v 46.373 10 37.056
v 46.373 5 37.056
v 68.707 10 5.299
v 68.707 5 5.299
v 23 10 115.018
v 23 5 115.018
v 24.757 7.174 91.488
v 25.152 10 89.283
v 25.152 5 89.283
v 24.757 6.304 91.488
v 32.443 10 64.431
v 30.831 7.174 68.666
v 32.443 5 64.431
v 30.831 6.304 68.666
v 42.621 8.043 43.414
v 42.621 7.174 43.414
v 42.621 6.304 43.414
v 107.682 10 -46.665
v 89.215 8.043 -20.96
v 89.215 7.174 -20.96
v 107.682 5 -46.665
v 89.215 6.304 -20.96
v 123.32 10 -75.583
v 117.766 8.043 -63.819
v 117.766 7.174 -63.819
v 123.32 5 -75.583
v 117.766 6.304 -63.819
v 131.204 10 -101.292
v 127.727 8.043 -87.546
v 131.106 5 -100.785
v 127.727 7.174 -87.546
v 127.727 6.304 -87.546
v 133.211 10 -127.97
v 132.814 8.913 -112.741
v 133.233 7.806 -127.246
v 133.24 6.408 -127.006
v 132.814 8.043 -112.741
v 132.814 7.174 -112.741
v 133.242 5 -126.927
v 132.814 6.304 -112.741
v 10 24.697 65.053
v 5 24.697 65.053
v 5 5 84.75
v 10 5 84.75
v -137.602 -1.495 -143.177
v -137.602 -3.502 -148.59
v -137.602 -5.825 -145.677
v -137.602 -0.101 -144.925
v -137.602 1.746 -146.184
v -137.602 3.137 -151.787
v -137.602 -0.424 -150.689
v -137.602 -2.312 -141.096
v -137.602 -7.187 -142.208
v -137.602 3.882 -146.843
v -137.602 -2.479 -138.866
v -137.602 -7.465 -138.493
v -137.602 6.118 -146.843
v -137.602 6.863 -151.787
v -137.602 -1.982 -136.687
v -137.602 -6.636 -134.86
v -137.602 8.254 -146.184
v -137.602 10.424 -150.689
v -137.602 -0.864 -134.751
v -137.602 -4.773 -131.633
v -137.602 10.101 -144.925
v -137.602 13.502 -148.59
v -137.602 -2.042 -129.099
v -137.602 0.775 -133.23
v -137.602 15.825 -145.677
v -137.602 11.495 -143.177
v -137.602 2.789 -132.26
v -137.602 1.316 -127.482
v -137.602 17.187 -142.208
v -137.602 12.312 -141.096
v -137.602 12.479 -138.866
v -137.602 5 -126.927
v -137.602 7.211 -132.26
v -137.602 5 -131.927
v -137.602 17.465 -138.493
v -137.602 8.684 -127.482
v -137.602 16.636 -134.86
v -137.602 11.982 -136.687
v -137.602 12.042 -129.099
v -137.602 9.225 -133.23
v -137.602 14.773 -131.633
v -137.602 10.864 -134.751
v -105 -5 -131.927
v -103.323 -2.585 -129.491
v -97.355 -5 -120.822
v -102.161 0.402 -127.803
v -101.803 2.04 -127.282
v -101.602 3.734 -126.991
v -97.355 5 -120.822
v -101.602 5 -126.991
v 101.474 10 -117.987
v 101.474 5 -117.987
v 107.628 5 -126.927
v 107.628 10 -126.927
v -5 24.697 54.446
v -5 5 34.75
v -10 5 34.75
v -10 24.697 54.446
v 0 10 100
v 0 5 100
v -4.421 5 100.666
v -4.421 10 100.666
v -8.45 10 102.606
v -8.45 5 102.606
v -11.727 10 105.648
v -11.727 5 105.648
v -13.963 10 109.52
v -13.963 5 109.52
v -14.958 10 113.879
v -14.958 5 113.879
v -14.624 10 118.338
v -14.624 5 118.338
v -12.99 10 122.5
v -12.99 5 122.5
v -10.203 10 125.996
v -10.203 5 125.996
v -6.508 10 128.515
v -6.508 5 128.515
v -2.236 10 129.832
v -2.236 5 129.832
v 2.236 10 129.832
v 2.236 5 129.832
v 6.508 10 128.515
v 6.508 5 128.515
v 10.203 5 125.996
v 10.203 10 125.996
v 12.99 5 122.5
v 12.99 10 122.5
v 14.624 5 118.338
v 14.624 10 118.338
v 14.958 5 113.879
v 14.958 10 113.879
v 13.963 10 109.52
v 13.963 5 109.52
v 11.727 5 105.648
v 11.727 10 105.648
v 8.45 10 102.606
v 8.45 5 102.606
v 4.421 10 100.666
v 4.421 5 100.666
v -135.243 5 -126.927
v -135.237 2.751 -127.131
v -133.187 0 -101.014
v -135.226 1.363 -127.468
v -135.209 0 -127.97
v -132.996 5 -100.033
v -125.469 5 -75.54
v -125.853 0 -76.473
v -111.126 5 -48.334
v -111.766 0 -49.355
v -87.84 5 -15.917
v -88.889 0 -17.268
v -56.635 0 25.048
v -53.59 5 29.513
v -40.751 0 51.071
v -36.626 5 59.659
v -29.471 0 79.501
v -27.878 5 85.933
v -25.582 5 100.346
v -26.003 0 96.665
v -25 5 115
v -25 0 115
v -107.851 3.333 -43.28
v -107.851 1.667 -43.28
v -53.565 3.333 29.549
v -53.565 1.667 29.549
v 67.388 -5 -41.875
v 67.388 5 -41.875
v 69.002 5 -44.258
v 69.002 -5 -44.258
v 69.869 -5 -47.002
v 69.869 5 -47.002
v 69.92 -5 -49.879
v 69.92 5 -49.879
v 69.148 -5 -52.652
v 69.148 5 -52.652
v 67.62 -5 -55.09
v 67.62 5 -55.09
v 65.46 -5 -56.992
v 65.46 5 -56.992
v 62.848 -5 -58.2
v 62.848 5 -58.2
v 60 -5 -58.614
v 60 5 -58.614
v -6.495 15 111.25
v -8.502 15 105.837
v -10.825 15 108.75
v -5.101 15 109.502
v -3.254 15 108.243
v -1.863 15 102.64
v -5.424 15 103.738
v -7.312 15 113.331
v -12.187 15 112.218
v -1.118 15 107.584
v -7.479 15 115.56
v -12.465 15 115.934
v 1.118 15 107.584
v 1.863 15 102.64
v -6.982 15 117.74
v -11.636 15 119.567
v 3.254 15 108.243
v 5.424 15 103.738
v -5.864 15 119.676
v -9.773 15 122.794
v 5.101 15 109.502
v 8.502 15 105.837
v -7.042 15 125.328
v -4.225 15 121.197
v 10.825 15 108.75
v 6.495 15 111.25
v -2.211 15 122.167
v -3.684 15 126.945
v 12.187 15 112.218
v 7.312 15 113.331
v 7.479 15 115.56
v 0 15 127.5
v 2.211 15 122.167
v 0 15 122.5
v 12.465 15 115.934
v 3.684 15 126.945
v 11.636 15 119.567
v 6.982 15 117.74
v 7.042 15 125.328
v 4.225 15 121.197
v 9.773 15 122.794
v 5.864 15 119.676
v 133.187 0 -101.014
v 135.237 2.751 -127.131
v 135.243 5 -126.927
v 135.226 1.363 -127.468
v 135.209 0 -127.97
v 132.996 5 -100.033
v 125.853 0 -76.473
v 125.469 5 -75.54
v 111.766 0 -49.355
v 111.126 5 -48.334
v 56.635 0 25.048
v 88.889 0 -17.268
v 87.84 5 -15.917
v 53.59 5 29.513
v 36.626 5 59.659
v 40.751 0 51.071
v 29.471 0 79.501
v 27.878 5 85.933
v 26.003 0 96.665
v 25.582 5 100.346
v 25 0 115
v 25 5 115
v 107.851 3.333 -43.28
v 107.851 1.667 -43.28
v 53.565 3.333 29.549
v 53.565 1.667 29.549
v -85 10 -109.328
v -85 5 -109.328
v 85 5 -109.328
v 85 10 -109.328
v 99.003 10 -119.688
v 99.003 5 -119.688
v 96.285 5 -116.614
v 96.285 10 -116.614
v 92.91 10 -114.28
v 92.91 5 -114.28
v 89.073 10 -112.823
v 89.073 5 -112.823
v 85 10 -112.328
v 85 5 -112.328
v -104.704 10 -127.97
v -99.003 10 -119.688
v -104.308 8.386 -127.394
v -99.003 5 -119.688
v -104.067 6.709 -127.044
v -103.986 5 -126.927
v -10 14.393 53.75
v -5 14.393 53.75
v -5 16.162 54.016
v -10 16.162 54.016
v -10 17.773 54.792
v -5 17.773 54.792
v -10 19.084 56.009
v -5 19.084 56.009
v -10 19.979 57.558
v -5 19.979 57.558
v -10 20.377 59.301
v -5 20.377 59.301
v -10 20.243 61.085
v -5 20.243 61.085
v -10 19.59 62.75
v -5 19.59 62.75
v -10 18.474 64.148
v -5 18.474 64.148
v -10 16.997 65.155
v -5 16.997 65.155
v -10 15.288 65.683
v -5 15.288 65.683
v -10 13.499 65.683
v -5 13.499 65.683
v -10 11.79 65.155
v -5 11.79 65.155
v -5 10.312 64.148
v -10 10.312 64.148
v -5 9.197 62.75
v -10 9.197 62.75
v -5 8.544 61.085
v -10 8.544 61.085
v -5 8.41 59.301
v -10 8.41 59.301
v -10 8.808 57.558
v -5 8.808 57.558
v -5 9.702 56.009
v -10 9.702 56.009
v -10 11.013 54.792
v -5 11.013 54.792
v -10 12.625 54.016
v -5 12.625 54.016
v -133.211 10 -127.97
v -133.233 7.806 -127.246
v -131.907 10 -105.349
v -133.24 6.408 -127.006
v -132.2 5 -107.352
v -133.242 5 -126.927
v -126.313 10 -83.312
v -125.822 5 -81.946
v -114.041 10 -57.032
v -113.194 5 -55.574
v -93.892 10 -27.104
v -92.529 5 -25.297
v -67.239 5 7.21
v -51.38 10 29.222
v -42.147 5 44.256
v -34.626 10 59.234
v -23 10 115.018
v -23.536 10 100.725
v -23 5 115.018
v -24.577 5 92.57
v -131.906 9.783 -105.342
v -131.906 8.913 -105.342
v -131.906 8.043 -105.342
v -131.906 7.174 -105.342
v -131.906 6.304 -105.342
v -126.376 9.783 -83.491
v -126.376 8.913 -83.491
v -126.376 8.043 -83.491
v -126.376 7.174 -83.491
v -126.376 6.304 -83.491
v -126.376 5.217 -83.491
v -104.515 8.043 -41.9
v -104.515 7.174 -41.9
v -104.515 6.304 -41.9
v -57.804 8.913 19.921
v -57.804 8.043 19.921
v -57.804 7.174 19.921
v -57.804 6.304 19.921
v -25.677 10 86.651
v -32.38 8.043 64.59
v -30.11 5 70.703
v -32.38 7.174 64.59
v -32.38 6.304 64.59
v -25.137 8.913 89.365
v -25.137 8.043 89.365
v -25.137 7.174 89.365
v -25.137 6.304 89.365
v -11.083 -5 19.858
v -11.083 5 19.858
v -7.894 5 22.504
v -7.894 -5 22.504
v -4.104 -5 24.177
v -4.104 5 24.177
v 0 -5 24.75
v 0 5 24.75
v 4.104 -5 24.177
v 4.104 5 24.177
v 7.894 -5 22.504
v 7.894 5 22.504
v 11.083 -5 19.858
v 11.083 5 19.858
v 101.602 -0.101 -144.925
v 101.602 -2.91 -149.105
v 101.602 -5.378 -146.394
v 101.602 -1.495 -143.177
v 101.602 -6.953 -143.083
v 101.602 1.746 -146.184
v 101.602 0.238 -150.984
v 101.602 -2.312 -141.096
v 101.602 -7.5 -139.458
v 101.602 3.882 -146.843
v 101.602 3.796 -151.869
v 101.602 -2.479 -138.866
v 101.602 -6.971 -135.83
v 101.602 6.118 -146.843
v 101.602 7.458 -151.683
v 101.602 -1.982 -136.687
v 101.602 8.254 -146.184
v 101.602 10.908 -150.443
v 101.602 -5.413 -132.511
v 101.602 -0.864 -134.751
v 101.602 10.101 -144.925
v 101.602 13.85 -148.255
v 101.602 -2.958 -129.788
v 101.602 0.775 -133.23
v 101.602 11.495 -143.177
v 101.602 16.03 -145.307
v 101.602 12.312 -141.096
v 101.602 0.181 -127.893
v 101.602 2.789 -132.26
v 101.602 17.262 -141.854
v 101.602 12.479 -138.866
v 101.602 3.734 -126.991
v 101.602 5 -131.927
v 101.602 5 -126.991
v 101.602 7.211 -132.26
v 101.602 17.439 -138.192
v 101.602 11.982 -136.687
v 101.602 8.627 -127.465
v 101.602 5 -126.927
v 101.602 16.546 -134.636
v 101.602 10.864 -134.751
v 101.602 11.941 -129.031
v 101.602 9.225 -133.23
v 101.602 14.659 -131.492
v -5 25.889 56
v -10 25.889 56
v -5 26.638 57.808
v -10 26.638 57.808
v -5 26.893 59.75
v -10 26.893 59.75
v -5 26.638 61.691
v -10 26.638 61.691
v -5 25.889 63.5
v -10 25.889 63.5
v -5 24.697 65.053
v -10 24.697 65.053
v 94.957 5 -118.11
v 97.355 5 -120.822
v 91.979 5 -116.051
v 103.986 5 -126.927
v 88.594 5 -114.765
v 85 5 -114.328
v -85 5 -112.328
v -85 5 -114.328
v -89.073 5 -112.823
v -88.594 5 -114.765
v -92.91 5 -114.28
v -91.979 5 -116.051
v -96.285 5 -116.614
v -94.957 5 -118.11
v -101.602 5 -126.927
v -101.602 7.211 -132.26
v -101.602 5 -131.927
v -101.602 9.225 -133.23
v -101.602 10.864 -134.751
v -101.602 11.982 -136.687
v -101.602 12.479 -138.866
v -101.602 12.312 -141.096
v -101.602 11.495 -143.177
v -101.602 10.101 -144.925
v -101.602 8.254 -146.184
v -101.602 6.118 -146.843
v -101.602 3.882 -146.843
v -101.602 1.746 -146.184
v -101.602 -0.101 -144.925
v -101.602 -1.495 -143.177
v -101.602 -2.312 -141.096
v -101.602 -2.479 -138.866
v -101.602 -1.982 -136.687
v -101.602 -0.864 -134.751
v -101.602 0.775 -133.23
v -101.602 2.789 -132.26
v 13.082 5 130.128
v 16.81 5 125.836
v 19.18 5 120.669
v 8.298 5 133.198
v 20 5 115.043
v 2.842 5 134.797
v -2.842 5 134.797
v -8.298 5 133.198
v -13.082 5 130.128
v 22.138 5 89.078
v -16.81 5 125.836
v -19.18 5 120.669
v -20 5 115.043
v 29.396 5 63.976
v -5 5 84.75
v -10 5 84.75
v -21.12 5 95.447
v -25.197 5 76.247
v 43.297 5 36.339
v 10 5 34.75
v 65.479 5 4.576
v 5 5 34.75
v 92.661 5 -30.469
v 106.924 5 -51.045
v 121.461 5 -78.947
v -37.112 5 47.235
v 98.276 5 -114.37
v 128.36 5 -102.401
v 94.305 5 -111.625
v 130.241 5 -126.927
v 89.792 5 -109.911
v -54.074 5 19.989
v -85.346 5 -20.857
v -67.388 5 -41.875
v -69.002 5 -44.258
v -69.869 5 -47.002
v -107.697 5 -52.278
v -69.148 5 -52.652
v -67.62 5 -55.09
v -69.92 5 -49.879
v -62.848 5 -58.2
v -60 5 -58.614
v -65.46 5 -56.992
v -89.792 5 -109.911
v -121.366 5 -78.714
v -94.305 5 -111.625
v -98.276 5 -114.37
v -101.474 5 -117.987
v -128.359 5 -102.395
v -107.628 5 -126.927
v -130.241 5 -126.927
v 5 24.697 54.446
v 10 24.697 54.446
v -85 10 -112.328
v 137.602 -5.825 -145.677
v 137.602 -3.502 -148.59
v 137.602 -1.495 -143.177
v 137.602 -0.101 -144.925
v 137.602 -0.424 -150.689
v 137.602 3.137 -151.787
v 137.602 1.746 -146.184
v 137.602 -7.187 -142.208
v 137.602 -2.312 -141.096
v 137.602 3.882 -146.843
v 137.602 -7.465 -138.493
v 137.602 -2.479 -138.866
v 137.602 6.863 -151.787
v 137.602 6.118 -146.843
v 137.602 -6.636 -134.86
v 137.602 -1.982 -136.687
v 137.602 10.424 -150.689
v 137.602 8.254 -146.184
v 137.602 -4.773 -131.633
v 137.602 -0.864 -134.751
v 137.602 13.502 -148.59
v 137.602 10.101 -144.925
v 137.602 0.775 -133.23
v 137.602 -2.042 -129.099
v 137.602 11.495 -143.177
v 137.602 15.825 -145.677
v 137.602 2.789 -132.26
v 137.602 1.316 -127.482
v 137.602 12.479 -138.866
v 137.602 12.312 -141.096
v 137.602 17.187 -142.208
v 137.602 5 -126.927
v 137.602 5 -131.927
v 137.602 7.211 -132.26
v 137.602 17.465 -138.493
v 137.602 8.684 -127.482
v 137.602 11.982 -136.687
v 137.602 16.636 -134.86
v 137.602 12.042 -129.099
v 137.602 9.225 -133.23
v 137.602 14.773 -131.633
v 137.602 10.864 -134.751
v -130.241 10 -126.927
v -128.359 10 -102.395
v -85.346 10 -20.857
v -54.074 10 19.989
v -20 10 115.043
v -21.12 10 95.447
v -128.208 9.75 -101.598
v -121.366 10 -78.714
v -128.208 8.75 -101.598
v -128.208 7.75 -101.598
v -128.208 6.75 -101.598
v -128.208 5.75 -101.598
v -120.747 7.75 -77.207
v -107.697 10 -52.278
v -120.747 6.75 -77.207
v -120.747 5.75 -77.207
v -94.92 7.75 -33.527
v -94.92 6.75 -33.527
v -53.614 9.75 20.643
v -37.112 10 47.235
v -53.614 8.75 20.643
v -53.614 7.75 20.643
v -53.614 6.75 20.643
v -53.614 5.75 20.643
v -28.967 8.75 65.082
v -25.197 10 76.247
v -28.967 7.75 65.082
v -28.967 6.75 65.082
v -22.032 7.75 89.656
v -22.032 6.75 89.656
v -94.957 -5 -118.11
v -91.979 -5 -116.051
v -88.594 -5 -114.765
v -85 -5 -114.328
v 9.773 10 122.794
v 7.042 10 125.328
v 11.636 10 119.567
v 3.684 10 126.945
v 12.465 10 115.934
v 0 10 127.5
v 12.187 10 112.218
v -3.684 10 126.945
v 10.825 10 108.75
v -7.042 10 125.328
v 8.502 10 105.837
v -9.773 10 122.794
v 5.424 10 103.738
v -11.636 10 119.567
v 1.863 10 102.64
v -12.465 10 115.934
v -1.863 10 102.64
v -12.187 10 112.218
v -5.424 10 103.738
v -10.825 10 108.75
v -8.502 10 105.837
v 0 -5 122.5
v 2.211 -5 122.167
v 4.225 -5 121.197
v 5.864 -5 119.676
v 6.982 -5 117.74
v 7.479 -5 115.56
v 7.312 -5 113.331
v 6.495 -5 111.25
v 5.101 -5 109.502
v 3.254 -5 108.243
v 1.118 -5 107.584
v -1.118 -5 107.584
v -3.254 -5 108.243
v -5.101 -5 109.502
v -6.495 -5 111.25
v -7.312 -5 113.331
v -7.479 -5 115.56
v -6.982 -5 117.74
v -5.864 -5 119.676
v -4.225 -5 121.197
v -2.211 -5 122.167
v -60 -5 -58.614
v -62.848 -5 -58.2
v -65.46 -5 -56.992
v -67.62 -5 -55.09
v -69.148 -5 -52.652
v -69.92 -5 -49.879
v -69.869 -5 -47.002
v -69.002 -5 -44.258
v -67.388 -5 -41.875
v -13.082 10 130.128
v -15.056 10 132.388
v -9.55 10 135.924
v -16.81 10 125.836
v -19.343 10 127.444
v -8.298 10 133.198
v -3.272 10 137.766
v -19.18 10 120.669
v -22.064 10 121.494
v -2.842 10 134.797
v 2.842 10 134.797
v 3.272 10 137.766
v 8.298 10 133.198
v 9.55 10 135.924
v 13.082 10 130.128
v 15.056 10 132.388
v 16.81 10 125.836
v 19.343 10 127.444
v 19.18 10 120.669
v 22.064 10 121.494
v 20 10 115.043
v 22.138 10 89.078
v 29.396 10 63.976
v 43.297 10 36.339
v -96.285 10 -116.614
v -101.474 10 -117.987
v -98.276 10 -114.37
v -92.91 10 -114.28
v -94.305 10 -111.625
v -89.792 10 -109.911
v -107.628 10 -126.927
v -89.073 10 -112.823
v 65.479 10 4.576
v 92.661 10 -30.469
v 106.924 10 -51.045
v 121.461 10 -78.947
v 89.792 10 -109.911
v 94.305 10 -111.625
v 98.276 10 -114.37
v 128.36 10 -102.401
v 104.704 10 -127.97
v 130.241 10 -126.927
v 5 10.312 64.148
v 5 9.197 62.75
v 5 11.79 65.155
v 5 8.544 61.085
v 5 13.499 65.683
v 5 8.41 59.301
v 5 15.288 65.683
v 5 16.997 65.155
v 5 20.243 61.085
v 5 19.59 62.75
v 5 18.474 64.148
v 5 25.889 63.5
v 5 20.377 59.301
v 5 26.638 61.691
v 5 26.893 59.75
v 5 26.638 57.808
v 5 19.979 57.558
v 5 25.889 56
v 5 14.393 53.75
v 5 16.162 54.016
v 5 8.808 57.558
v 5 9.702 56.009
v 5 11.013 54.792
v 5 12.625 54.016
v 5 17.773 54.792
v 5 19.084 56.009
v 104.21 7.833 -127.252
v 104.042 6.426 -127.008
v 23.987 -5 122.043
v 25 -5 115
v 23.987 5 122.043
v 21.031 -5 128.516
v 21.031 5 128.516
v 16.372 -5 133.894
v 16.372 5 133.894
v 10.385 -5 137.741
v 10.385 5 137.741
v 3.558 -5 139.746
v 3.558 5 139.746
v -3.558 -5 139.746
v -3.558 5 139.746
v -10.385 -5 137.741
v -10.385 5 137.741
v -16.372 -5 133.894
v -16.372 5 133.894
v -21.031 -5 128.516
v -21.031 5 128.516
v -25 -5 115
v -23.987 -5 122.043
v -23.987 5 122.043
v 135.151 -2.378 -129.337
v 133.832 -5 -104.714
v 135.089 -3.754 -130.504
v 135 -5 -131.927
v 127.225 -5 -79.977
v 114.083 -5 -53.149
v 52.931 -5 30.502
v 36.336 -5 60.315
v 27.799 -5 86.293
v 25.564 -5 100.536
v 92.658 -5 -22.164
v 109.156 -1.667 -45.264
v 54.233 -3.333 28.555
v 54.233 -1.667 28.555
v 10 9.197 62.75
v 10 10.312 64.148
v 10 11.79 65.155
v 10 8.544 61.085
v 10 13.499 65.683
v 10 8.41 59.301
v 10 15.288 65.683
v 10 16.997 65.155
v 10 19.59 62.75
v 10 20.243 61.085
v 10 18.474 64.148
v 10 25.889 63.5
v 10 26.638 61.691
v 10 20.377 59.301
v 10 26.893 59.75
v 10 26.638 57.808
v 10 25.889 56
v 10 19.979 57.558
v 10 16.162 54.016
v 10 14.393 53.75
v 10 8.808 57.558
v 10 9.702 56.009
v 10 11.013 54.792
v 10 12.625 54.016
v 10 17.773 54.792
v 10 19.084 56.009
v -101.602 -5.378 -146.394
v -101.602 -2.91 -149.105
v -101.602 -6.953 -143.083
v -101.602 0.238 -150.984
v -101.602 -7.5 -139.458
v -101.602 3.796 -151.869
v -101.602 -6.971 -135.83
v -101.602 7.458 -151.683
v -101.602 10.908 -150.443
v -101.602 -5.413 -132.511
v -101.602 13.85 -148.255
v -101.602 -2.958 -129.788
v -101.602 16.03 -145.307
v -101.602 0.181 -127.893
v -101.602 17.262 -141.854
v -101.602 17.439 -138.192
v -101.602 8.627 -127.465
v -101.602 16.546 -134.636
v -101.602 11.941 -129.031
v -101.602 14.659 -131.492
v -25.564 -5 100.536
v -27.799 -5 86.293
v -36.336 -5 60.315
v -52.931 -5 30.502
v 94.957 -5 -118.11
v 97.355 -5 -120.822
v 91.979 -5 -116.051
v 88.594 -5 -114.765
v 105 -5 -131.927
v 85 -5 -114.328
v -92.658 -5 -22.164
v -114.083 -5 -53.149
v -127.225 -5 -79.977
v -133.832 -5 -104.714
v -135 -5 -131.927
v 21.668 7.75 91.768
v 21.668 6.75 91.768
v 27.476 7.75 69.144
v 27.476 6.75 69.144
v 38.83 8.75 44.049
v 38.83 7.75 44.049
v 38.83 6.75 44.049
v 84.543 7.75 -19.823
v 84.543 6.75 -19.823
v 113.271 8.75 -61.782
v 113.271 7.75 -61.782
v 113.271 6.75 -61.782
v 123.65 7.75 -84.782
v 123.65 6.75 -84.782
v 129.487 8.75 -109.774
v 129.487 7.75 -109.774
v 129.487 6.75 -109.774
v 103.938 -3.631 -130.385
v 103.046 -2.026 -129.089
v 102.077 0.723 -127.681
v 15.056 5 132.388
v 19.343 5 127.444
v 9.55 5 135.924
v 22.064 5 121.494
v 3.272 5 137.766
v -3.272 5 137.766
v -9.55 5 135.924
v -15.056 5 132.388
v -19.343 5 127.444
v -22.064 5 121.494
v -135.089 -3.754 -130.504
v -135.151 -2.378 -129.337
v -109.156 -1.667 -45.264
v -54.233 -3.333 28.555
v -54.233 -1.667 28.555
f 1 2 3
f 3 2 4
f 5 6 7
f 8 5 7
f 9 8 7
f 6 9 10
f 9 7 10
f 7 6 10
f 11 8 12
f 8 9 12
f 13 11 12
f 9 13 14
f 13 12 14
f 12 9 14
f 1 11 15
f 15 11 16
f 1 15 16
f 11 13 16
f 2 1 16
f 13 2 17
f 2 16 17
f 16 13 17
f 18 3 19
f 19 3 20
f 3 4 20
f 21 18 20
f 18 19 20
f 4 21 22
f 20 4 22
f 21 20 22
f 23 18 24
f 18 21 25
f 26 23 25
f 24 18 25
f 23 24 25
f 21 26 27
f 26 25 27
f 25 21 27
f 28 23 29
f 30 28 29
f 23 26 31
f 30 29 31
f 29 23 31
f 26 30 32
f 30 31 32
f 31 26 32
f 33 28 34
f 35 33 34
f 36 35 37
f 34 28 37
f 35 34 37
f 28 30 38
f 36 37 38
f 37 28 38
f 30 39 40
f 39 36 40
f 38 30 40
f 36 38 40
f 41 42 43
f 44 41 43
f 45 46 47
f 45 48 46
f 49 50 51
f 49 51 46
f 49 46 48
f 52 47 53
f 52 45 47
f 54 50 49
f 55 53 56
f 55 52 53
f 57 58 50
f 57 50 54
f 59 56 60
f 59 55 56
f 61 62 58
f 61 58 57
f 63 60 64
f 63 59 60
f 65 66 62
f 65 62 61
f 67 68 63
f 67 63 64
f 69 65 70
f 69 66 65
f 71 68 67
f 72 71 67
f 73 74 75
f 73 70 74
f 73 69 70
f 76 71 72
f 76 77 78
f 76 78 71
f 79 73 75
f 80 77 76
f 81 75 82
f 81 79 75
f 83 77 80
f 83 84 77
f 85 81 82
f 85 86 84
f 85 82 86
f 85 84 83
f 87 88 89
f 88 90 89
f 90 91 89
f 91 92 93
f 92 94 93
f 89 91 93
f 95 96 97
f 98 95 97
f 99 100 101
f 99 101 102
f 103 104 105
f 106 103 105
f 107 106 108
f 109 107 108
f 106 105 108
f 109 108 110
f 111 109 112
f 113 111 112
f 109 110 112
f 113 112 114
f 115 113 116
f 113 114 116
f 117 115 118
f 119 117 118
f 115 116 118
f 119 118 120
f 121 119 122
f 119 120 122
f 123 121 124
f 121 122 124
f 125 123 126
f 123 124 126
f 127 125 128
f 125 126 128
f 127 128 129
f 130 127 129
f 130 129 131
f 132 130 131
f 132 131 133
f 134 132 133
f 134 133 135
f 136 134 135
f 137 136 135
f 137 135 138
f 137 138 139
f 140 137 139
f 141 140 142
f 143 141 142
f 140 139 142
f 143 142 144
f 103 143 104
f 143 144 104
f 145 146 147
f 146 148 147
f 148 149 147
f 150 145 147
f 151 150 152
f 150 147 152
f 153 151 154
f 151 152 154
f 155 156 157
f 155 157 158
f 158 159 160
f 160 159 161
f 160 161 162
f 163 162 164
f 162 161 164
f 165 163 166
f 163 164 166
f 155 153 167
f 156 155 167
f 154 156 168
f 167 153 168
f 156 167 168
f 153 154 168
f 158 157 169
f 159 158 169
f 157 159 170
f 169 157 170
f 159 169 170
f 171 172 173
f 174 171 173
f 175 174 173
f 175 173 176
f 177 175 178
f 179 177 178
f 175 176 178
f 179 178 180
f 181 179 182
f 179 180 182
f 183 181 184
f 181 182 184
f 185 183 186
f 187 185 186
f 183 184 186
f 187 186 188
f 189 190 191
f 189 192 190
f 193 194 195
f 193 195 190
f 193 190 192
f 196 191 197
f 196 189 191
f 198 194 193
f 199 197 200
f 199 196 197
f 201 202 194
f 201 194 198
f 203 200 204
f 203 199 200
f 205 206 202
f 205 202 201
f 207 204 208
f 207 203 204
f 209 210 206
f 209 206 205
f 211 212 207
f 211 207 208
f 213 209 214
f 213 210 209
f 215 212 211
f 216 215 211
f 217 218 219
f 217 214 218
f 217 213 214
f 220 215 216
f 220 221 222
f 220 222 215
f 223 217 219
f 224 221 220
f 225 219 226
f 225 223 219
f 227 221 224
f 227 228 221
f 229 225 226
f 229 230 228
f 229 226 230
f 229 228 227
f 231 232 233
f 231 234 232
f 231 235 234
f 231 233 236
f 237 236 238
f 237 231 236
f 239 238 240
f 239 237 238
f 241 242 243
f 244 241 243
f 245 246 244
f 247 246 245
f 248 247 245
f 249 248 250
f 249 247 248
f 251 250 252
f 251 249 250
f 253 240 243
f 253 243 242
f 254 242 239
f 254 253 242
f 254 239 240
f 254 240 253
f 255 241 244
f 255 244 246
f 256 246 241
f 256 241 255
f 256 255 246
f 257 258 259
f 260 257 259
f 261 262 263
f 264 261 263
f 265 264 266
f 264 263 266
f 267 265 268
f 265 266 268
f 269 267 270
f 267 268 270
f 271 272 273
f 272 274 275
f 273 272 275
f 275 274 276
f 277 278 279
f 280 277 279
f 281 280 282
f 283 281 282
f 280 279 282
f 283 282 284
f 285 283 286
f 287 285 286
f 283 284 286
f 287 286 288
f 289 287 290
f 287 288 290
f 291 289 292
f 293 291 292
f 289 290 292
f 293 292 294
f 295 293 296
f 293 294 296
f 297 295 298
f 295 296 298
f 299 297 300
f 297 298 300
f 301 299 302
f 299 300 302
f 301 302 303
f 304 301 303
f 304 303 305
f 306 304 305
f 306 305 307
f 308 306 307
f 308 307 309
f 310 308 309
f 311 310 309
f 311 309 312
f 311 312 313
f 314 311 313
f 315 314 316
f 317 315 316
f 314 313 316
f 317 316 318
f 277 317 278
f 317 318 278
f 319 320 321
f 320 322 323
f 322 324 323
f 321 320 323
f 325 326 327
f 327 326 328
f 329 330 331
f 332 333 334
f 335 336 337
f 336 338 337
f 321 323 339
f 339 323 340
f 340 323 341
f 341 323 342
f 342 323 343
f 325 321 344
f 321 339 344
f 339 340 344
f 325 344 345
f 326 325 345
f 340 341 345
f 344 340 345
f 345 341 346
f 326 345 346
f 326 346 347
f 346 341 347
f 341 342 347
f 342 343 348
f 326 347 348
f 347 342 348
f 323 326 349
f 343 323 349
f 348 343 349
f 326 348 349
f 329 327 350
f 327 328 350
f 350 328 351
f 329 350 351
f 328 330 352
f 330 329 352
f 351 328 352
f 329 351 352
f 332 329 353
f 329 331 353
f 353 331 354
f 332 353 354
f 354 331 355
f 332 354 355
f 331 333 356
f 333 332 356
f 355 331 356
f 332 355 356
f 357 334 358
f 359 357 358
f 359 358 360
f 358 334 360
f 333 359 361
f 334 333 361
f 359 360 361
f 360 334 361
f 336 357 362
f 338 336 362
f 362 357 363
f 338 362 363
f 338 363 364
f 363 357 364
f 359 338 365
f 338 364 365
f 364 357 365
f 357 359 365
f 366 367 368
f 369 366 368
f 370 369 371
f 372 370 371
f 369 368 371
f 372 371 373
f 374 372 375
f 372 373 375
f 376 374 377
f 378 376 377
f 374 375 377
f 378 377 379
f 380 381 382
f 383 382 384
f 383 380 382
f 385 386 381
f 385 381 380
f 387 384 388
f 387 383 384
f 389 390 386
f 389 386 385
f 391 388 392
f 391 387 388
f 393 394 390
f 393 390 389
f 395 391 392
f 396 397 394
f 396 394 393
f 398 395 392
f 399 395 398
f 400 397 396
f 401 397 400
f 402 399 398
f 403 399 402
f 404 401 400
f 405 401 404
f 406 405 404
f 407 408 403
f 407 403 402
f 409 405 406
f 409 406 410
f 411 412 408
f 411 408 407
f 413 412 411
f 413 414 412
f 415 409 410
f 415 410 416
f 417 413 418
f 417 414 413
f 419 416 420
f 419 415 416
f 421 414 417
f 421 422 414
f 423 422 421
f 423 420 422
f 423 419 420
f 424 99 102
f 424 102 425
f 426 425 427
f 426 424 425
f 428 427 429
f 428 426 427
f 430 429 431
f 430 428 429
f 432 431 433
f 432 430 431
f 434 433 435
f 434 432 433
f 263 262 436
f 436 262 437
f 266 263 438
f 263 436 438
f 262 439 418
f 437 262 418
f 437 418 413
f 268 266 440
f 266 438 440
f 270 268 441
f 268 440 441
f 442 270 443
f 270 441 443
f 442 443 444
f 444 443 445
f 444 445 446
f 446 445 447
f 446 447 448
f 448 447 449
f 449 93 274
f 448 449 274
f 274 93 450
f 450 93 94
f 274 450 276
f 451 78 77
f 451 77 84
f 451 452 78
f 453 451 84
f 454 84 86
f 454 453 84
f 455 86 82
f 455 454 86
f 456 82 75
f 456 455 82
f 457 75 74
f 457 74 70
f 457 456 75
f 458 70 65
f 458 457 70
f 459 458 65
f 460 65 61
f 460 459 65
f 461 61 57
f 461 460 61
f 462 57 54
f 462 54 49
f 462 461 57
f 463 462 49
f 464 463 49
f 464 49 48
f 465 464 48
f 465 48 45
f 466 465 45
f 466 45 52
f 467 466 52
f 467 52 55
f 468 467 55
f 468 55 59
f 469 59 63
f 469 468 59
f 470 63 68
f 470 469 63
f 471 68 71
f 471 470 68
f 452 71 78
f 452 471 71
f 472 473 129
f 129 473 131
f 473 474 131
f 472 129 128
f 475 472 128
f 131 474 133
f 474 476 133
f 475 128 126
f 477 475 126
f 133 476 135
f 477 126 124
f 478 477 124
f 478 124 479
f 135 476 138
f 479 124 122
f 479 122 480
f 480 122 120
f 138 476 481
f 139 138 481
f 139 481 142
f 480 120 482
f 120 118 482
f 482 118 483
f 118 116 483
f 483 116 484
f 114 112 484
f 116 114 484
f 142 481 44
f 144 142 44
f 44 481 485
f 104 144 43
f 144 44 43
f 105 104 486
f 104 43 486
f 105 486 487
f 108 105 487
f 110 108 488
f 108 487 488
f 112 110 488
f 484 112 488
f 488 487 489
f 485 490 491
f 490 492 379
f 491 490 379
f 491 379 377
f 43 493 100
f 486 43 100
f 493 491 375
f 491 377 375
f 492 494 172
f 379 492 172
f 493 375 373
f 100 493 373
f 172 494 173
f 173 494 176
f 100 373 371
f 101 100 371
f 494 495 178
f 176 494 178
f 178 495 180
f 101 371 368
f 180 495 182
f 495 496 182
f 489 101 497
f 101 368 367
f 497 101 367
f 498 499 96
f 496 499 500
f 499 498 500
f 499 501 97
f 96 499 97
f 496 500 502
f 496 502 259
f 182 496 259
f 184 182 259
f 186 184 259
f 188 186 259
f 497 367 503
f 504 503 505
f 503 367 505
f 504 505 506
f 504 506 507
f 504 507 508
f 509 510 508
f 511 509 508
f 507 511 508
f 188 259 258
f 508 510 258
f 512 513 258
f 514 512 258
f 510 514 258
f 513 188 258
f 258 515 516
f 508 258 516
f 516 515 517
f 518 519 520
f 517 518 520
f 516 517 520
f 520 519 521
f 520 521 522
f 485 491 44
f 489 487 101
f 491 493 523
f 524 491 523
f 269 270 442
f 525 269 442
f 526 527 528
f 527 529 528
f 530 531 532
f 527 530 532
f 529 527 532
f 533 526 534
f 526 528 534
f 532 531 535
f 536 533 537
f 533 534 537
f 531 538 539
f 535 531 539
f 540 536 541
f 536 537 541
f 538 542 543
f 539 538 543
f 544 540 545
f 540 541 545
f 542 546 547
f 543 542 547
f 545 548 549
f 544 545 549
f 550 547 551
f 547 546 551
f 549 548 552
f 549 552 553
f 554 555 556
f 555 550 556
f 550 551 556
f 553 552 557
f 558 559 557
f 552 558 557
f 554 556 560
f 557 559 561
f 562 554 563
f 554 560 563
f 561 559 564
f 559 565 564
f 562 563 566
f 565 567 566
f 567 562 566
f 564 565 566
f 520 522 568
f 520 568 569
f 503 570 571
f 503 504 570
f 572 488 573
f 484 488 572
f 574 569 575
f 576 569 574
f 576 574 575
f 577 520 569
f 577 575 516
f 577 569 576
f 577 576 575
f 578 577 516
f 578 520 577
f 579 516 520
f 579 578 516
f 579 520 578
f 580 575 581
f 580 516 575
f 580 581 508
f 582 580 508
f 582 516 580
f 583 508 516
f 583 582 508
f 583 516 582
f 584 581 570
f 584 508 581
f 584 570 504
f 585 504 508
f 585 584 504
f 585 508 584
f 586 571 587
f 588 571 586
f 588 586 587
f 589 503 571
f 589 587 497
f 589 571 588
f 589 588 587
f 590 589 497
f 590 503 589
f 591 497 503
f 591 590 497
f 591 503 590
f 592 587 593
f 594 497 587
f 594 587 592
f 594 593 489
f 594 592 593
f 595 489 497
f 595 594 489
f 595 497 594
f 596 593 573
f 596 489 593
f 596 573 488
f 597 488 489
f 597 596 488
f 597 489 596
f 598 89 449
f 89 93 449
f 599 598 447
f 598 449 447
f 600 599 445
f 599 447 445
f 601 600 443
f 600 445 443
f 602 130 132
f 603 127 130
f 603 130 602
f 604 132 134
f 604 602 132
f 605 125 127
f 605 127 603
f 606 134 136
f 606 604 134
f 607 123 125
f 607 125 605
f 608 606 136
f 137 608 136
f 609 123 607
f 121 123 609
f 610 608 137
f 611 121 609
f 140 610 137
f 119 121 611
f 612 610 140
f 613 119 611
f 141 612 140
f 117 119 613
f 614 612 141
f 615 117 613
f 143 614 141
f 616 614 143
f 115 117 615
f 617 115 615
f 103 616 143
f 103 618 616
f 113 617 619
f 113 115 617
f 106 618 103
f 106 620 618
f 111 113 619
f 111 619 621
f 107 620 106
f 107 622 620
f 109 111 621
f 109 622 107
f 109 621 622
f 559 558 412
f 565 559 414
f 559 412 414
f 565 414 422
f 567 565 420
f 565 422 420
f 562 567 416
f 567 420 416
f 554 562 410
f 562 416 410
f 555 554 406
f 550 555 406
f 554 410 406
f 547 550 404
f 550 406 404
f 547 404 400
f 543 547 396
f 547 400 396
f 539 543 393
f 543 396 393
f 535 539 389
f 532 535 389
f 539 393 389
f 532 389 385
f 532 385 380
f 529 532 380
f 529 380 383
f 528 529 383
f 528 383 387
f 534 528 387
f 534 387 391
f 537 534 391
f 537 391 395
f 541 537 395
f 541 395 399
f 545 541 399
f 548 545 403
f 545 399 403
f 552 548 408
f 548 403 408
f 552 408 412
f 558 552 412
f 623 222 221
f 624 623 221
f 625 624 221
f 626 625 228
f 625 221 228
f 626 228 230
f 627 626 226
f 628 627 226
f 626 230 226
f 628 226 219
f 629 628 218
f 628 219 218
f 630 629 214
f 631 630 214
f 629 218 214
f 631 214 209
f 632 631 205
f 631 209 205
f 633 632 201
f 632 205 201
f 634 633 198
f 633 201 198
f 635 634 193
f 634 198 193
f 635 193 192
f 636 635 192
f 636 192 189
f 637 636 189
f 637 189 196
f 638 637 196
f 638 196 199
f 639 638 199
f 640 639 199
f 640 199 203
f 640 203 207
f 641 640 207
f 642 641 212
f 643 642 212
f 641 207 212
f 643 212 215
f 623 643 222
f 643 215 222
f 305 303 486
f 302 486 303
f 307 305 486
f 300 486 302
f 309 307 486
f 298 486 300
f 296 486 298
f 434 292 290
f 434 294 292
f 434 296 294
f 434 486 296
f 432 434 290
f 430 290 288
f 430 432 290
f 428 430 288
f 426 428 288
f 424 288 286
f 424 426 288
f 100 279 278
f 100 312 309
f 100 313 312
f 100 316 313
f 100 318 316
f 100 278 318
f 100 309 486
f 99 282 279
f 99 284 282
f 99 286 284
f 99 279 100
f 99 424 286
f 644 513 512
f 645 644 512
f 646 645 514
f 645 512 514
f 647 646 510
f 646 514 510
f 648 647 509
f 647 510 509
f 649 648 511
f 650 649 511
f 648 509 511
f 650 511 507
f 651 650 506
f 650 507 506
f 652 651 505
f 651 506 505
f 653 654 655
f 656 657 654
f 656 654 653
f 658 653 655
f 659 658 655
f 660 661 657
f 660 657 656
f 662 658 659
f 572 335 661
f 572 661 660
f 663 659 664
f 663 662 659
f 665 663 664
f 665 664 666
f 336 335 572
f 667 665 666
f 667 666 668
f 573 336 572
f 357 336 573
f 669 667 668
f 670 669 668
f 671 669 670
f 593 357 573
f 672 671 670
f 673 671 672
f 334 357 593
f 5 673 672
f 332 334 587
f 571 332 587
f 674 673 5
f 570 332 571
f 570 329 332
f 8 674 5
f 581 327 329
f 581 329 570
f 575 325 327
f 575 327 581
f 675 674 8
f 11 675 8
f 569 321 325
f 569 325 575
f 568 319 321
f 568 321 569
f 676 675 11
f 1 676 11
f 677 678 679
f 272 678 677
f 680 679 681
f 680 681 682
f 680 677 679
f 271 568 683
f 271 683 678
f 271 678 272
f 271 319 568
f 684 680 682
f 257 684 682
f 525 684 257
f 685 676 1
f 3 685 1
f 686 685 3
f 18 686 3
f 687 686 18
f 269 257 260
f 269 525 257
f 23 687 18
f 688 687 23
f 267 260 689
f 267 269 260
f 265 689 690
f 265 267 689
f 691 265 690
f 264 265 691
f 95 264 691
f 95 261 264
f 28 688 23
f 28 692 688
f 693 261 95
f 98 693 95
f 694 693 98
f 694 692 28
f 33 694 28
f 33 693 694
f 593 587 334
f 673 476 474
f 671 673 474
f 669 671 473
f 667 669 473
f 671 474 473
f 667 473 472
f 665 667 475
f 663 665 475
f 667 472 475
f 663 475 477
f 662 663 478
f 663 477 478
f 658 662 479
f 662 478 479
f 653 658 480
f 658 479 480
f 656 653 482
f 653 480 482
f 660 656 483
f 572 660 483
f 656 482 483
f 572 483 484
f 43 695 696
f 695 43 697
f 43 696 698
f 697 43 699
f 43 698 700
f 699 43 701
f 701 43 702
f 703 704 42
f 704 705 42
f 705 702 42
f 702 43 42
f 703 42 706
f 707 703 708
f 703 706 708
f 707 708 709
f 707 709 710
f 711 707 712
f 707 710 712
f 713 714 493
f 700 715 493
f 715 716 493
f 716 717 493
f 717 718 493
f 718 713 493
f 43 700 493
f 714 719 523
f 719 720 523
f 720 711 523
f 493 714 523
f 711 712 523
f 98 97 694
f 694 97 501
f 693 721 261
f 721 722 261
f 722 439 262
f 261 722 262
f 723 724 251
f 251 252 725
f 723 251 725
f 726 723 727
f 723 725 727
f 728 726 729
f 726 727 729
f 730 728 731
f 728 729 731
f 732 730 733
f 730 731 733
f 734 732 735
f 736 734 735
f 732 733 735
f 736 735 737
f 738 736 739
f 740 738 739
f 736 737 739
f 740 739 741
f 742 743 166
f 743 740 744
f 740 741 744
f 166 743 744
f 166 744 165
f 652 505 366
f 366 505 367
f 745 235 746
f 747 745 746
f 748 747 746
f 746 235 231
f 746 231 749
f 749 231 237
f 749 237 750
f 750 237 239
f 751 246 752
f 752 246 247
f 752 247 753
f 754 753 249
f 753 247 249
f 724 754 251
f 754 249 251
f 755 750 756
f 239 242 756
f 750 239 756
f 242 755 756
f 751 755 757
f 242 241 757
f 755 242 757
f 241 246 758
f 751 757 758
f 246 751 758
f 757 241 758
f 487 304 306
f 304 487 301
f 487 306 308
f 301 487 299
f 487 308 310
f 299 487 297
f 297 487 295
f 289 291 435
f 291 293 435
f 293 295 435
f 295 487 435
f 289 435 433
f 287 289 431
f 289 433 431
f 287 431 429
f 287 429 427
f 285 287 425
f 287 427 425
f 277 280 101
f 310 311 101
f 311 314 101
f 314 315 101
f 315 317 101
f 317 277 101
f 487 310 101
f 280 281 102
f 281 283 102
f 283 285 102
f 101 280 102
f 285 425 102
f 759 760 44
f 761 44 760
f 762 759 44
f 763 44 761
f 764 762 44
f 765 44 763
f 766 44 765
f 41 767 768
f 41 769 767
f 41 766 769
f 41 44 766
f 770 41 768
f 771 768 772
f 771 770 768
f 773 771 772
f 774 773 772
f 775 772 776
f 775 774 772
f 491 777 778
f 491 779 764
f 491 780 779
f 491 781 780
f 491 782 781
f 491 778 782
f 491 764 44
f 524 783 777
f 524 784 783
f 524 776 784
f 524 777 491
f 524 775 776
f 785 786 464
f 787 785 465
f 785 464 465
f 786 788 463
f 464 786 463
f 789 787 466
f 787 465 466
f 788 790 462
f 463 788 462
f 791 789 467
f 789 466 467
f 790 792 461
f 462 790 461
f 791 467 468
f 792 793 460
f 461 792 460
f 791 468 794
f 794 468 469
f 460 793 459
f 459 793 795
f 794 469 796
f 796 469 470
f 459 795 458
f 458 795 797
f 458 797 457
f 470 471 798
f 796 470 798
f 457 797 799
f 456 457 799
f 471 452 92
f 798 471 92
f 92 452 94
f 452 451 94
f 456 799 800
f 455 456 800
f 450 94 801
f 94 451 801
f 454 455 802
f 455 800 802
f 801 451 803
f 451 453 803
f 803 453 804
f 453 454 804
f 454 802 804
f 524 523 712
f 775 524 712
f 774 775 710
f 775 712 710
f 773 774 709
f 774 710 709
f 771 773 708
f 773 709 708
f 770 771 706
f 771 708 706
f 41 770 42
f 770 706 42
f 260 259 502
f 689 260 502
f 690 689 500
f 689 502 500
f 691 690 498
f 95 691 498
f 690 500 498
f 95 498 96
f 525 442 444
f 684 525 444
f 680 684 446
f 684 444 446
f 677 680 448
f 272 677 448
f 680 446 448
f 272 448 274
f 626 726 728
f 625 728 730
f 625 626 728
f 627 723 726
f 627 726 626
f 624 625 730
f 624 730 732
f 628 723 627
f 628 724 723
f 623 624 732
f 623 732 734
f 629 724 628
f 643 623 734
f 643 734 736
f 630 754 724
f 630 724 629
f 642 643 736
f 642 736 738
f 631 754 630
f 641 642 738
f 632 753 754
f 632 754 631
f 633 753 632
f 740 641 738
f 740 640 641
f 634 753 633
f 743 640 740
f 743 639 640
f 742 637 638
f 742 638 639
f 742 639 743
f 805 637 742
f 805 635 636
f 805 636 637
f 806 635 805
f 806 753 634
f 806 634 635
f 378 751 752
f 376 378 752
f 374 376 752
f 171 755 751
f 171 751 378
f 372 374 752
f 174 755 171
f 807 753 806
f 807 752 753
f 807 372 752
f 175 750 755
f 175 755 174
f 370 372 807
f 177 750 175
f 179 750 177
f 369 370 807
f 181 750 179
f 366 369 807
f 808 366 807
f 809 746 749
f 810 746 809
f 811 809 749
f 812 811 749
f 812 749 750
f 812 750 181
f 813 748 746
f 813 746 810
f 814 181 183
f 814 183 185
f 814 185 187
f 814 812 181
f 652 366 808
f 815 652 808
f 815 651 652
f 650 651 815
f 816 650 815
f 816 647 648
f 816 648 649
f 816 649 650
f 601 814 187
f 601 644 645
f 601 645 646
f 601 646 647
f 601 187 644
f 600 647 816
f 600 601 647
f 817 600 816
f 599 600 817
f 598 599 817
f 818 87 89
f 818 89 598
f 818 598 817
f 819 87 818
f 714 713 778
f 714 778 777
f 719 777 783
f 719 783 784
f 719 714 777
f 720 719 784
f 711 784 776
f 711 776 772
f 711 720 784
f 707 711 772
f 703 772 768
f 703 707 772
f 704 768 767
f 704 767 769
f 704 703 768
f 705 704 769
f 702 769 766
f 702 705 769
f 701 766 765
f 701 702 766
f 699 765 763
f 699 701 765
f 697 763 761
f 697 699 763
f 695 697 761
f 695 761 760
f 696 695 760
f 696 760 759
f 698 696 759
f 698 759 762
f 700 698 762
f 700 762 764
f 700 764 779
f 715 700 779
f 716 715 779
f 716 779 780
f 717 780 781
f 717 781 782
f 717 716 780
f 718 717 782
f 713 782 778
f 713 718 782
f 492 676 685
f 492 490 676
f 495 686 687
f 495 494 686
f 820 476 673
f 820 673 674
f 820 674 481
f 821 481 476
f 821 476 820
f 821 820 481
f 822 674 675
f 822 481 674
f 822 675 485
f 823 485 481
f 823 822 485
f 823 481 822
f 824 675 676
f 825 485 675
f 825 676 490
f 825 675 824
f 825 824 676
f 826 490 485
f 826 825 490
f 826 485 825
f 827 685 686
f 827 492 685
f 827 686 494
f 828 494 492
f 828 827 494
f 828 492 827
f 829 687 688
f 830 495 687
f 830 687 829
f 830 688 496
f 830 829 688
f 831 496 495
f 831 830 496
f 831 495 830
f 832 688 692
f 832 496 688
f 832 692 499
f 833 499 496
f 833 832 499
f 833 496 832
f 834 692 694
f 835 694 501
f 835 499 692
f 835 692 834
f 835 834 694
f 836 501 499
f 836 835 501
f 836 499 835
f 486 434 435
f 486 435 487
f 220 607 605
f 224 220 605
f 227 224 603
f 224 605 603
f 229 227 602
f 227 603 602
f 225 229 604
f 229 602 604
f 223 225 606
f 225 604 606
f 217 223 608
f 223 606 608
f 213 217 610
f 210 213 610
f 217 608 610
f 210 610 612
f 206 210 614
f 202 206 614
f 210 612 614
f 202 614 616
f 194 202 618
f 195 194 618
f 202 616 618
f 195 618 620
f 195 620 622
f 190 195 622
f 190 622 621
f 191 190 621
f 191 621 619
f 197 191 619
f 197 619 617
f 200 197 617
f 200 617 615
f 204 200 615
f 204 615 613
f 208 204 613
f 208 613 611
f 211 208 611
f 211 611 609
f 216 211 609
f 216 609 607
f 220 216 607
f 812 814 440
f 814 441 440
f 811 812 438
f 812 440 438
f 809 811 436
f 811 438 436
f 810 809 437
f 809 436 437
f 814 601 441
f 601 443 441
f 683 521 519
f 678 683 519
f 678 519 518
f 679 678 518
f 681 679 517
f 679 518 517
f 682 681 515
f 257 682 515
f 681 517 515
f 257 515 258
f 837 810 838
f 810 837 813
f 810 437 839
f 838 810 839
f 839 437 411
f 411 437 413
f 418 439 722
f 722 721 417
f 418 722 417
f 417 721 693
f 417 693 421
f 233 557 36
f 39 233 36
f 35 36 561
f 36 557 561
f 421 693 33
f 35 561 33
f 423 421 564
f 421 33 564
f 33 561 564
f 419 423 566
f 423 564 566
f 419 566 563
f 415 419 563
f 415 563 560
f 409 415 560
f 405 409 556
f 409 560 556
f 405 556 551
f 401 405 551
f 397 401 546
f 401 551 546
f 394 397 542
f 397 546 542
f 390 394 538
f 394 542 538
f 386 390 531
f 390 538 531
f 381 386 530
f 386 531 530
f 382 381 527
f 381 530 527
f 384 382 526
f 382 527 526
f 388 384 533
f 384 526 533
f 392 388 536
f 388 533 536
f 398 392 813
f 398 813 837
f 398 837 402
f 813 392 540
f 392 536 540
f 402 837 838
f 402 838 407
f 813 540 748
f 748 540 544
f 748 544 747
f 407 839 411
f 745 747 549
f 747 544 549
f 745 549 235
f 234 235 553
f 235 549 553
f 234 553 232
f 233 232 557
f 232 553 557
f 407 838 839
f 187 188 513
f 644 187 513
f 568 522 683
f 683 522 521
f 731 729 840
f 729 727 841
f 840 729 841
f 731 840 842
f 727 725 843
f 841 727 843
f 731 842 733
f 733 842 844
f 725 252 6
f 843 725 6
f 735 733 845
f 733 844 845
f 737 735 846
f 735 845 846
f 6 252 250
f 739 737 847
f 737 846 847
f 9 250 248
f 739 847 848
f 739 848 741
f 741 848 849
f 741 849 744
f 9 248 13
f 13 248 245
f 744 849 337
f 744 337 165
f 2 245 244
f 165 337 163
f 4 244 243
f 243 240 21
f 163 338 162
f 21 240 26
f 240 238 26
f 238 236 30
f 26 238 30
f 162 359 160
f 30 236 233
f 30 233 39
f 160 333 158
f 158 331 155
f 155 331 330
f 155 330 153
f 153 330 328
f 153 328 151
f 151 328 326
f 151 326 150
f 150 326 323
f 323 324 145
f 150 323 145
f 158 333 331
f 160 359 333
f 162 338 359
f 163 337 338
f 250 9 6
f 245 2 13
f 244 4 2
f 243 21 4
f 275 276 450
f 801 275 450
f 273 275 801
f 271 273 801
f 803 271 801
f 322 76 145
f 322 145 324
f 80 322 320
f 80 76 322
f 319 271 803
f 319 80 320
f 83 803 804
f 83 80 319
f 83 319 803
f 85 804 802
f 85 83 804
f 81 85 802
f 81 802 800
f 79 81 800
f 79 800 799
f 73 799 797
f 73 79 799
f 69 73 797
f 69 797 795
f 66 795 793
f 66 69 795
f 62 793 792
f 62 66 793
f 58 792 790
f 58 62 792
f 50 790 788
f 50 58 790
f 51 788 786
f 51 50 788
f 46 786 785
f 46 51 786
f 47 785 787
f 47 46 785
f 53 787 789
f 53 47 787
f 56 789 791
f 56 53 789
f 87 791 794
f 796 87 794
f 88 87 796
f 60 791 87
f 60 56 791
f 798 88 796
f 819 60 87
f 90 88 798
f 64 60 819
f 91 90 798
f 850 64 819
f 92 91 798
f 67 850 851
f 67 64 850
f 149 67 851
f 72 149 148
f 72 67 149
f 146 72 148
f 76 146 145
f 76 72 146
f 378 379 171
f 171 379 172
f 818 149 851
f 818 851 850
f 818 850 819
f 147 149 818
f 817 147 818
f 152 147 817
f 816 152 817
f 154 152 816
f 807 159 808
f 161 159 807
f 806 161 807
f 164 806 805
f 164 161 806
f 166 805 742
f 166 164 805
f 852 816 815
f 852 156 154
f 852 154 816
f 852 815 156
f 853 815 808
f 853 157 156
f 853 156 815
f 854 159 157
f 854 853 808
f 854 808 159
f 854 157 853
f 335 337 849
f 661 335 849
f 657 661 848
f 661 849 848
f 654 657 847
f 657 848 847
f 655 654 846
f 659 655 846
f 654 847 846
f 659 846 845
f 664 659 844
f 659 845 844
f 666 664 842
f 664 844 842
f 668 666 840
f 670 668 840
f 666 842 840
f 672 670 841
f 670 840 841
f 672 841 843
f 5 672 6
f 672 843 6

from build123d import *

# Parameters (mm, degrees)
SALIENTE_EXTRUIR1_DEPTH = 5
CROQUIS6_R              = 6
SALIENTE_EXTRUIR2_DEPTH = 5
EXTRUIR_L_MINA1_DEPTH   = 5
CROQUIS9_R              = 12.5
CROQUIS9_R_2            = 7.5
SALIENTE_EXTRUIR3_DEPTH = 18
CROQUIS10_R             = 15
SALIENTE_EXTRUIR4_DEPTH = 5
CROQUIS10_3_R           = 12.5
SALIENTE_EXTRUIR5_DEPTH = 10
CROQUIS11_R             = 7.5
CORTAR_EXTRUIR1_DEPTH   = 20


# Read off the part's stored shape, not the designer's step: Extruir-Lámina1
with BuildPart() as part:
    # Croquis1 → Saliente-Extruir1 (new, symmetric)
    with BuildSketch(Plane(origin=(0, 0, 0), x_dir=(1, 0, 0), z_dir=(0, 1, 0))):
        with BuildLine():
            Line((-135, 131.926889983), (-105, 131.926889983))
            Line((-105, 131.926889983), (-97.355197186, 120.822380101))
            ThreePointArc((-97.355197186, 120.822380101), (-91.978989417, 116.050643627), (-85, 114.328207662))
            Line((-85, 114.328207662), (85, 114.328207662))
            ThreePointArc((85, 114.328207662), (91.978989417, 116.050643627), (97.355197186, 120.822380101))
            Line((97.355197186, 120.822380101), (105, 131.926889983))
            Line((105, 131.926889983), (135, 131.926889983))
            add(Edge.make_bspline(
                [(135, 131.926889983), (141.952707227, 30.351328575), (23.130947771, -13.752661754), (25, -115)],
                knots=[0, 0, 0, 0, 1, 1, 1, 1], degree=3))
            ThreePointArc((25, -115), (0, -140), (-25, -115))
            add(Edge.make_bspline(
                [(-135, 131.926889983), (-141.952707227, 30.351328575), (-23.130947771, -13.752661754), (-25, -115)],
                knots=[0, 0, 0, 0, 1, 1, 1, 1], degree=3))
        make_face()
        with BuildLine():
            Line((-67.388374008, 41.875089785), (-11.082561012, -19.857874005))
            ThreePointArc((-11.082561012, -19.857874005), (0, -24.749617904), (11.082561012, -19.857874005))
            Line((11.082561012, -19.857874005), (67.388374008, 41.875089785))
            ThreePointArc((67.388374008, 41.875089785), (69.148452711, 52.651972876), (60, 58.613927185))
            Line((60, 58.613927185), (-60, 58.613927185))
            ThreePointArc((-60, 58.613927185), (-69.148452711, 52.651972876), (-67.388374008, 41.875089785))
        make_face(mode=Mode.SUBTRACT)
    extrude(amount=SALIENTE_EXTRUIR1_DEPTH, both=True)

    # Croquis6 → Saliente-Extruir2 (add)
    with BuildSketch(Plane(origin=(5, 0, 0), x_dir=(0, 0, -1), z_dir=(1, 0, 0))):
        with BuildLine():
            Line((-34.749617904, 5), (-54.446317045, 24.696699141))
            ThreePointArc((-54.446317045, 24.696699141), (-59.749617904, 26.893398282), (-65.052918763, 24.696699141))
            Line((-65.052918763, 24.696699141), (-84.749617904, 5))
            Line((-84.749617904, 5), (-34.749617904, 5))
        make_face()
        with Locations((-59.749617904, 14.393398282)):
            Circle(CROQUIS6_R, mode=Mode.SUBTRACT)
    saliente_extruir2 = extrude(amount=SALIENTE_EXTRUIR2_DEPTH)

    # Simetría1: Saliente-Extruir2 across plane
    add(saliente_extruir2.mirror(Plane(origin=(0, 0, 0), x_dir=(0, 0, 1), z_dir=(1, 0, 0))))

    # Extruir-Lámina1 outline → Extruir-Lámina1 (add)
    with BuildSketch(Plane(origin=(0, 5, 0), x_dir=(1, 0, 0), z_dir=(0, 1, 0))):
        with BuildLine():
            Line((-106.051245454, 129.926889983), (-133.152785768, 129.926889983))
            add(Edge.make_bspline(
                [(-133.152785768, 129.926889983), (-133.174268661, 129.206657548), (-133.195751554, 128.486425113), (-133.238717339, 127.045960243), (-133.260373261, 126.325704896), (-133.29971078, 124.168332797), (-133.301445055, 119.863777053), (-133.071902544, 115.589846855), (-132.303121335, 107.08299626), (-131.375659828, 101.466708751), (-129.377010697, 93.122716596), (-128.609455105, 90.354805161), (-127.310297322, 86.222512835), (-126.853085806, 84.849889782), (-125.898422992, 82.13221094), (-125.400190812, 80.784491049), (-122.810267538, 74.098434679), (-120.42291954, 68.917392178), (-115.158069426, 58.816076633), (-112.280987066, 53.895580273), (-107.696886081, 46.657669825), (-106.124147998, 44.268816441), (-102.905009703, 39.53029905), (-101.257661562, 37.179322504), (-92.887901697, 25.518907347), (-85.780126078, 16.499131041), (-71.58045013, -1.552311855), (-64.485262059, -10.58151599), (-56.133776454, -22.255618212), (-54.489378689, -24.60983677), (-51.266448327, -29.367605618), (-49.686457, -31.773531765), (-45.084200101, -39.052900232), (-42.196352007, -43.992840655), (-36.899381702, -54.103765632), (-34.490320683, -59.274779718), (-31.324385536, -67.247350119), (-30.343694104, -69.940887052), (-28.995690401, -74.040571223), (-28.566659059, -75.417806864), (-27.752342999, -78.1897194), (-27.36871345, -79.578876355), (-25.569409892, -86.540828042), (-24.511463015, -92.162286021), (-23.173842405, -103.511074009), (-22.89542751, -109.238575264), (-22.999992819, -115.018175056)],
                knots=[0, 0, 0, 0, 0.0078125, 0.0078125, 0.015625, 0.015625, 0.03125, 0.0625, 0.0625, 0.125, 0.125, 0.15625, 0.15625, 0.171875, 0.171875, 0.1875, 0.1875, 0.25, 0.25, 0.3125, 0.3125, 0.34375, 0.34375, 0.375, 0.375, 0.5, 0.5, 0.625, 0.625, 0.65625, 0.65625, 0.6875, 0.6875, 0.75, 0.75, 0.8125, 0.8125, 0.84375, 0.84375, 0.859375, 0.859375, 0.875, 0.875, 0.9375, 0.9375, 1, 1, 1, 1], degree=3))
            ThreePointArc((-22.999992819, -115.018175056), (0, -138), (22.999992819, -115.018175056))
            add(Edge.make_bspline(
                [(22.999992819, -115.018175056), (22.895226578, -109.227469196), (23.175119897, -103.499493799), (24.510635399, -92.170049231), (25.564939035, -86.568365032), (27.708902858, -78.257572863), (28.51704955, -75.502555539), (29.865517568, -71.392248939), (30.338548889, -70.023401781), (31.323606713, -67.307934522), (33.883396821, -60.573683364), (36.902914511, -54.096952925), (44.842899172, -38.941069981), (51.05964732, -29.354413219), (59.399269025, -17.689647357), (61.096404781, -15.371876329), (64.528507919, -10.767382329), (66.263972325, -8.479913942), (71.509332424, -1.647173505), (75.058209766, 2.868422579), (82.159416645, 11.896986658), (85.711763576, 16.409941411), (92.71853999, 25.510393556), (96.172818384, 30.098005967), (101.199601756, 37.097144589), (102.850583686, 39.451755912), (106.077537799, 44.198688655), (107.653878795, 46.591420768), (112.247661329, 53.839778233), (115.129622576, 58.765689131), (120.401963318, 68.872537636), (122.791888775, 74.053710792), (125.900918311, 82.072340278), (126.85794185, 84.78636685), (128.595390264, 90.306037259), (129.365828105, 93.080127996), (131.371298301, 101.438867894), (132.300684578, 107.06336018), (133.071299421, 115.579637461), (133.224668995, 118.431600887), (133.300279497, 122.729249291), (133.29974204, 124.165082676), (133.260423161, 126.323746033), (133.238764128, 127.044391606), (133.195774948, 128.485640795), (133.174280358, 129.206265389), (133.152785768, 129.926889983)],
                knots=[0, 0, 0, 0, 0.0625, 0.0625, 0.125, 0.125, 0.15625, 0.15625, 0.171875, 0.171875, 0.1875, 0.25, 0.25, 0.375, 0.375, 0.40625, 0.40625, 0.4375, 0.4375, 0.5, 0.5, 0.5625, 0.5625, 0.625, 0.625, 0.65625, 0.65625, 0.6875, 0.6875, 0.75, 0.75, 0.8125, 0.8125, 0.84375, 0.84375, 0.875, 0.875, 0.9375, 0.9375, 0.96875, 0.96875, 0.984375, 0.984375, 0.9921875, 0.9921875, 1, 1, 1, 1], degree=3))
            Line((133.152785768, 129.926889983), (106.051245454, 129.926889983))
            Line((106.051245454, 129.926889983), (99.00255681, 119.688269759))
            ThreePointArc((99.00255681, 119.688269759), (92.90952134, 114.280301755), (85, 112.328207662))
            Line((85, 112.328207662), (-85, 112.328207662))
            ThreePointArc((-85, 112.328207662), (-92.90952134, 114.280301755), (-99.00255681, 119.688269759))
            Line((-99.00255681, 119.688269759), (-106.051245454, 129.926889983))
        make_face()
        with BuildLine():
            add(Edge.make_bspline(
                [(-130.240934691, 126.926889983), (-130.411547803, 121.206938866), (-130.167660454, 115.547790898), (-128.847873599, 104.35154298), (-127.771663621, 98.814488573), (-125.924626652, 91.966775959), (-125.530222733, 90.600900181), (-124.692269656, 87.876357749), (-124.247843704, 86.515308788), (-122.852183388, 82.470259757), (-121.837255643, 79.818705121), (-118.567479133, 71.984263185), (-116.088003331, 66.921402163), (-110.672433719, 57.039667488), (-107.736270132, 52.220831119), (-103.088325832, 45.122793633), (-101.498316815, 42.778525535), (-98.252555912, 38.12511811), (-96.597218478, 35.816635505), (-88.212586529, 24.366109238), (-81.147647458, 15.472894286), (-67.116887318, -2.387674605), (-60.14620433, -11.351391892), (-51.980786937, -22.965887821), (-50.3752326, -25.30937845), (-47.232310585, -30.047362451), (-45.695210028, -32.441712267), (-41.22621426, -39.683394316), (-38.430313516, -44.598820237), (-33.314610216, -54.657139194), (-30.994773138, -59.800015737), (-27.952783748, -67.72348367), (-27.011738958, -70.399494027), (-25.719660825, -74.470598268), (-25.308321792, -75.839168342), (-24.529959844, -78.586079762), (-24.163389081, -79.962558454), (-22.44464198, -86.860207974), (-21.435659553, -92.427263793), (-20.161720093, -103.660851552), (-19.89654276, -109.327354037), (-19.999953481, -115.043136709)],
                knots=[0, 0, 0, 0, 0.0625, 0.0625, 0.125, 0.125, 0.140625, 0.140625, 0.15625, 0.15625, 0.1875, 0.1875, 0.25, 0.25, 0.3125, 0.3125, 0.34375, 0.34375, 0.375, 0.375, 0.5, 0.5, 0.625, 0.625, 0.65625, 0.65625, 0.6875, 0.6875, 0.75, 0.75, 0.8125, 0.8125, 0.84375, 0.84375, 0.859375, 0.859375, 0.875, 0.875, 0.9375, 0.9375, 1, 1, 1, 1], degree=3))
            Line((-130.240934691, 126.926889983), (-107.628113635, 126.926889983))
            Line((-107.628113635, 126.926889983), (-101.473596247, 117.987104247))
            ThreePointArc((-101.473596247, 117.987104247), (-94.305319223, 111.624788948), (-85, 109.328207662))
            Line((-85, 109.328207662), (85, 109.328207662))
            ThreePointArc((85, 109.328207662), (94.305319223, 111.624788948), (101.473596247, 117.987104247))
            Line((101.473596247, 117.987104247), (107.628113635, 126.926889983))
            Line((107.628113635, 126.926889983), (130.240934691, 126.926889983))
            add(Edge.make_bspline(
                [(19.999953481, -115.043136709), (19.896427023, -109.32095693), (20.162471748, -103.656694634), (21.433484981, -92.443970754), (22.438644162, -86.895539052), (24.487167219, -78.657640706), (25.259980416, -75.925774614), (26.550800135, -71.848599206), (27.003831738, -70.490678553), (27.947611297, -67.796645784), (28.438448915, -66.459946369), (30.982768295, -59.825525168), (33.30643755, -54.67491864), (40.970707434, -39.600575574), (47.003894339, -30.053947563), (55.153034009, -18.451527139), (56.813969399, -16.146756985), (60.17676541, -11.571661263), (65.284475951, -4.757529312), (70.527406248, 1.95332666), (77.541655616, 10.883052022), (81.060774666, 15.338753839), (88.025039956, 24.30665524), (91.470366291, 28.818717273), (96.504855219, 35.688773254), (98.16144298, 37.996989622), (101.405963711, 42.643758601), (102.99490041, 44.983639174), (107.638239543, 52.064402242), (110.569379356, 56.866302948), (118.67461083, 71.612676057), (123.164034637, 81.896076903), (126.554911876, 94.28650979), (126.908556251, 95.67466944), (127.567304158, 98.475017725), (127.87138094, 99.883309895), (128.701614509, 104.108909856), (129.147967615, 106.936415177), (130.164965006, 115.450310911), (130.412704392, 121.16816323), (130.240934691, 126.926889983)],
                knots=[0, 0, 0, 0, 0.0625, 0.0625, 0.125, 0.125, 0.15625, 0.15625, 0.171875, 0.171875, 0.1875, 0.1875, 0.25, 0.25, 0.375, 0.375, 0.40625, 0.40625, 0.4375, 0.5, 0.5, 0.5625, 0.5625, 0.625, 0.625, 0.65625, 0.65625, 0.6875, 0.6875, 0.75, 0.75, 0.875, 0.875, 0.890625, 0.890625, 0.90625, 0.90625, 0.9375, 0.9375, 1, 1, 1, 1], degree=3))
            ThreePointArc((19.999953481, -115.043136709), (0, -135), (-19.999953481, -115.043136709))
        make_face(mode=Mode.SUBTRACT)
    extrude(amount=EXTRUIR_L_MINA1_DEPTH)

    # Croquis9 → Saliente-Extruir3 (add, symmetric)
    with BuildSketch(Plane(origin=(-119.602015611, 10, -129.926889983), x_dir=(0, 0, 1), z_dir=(-1, 0, 0))):
        with Locations((-9.5, -5)):
            Circle(CROQUIS9_R)
        with Locations((-9.5, -5)):
            Circle(CROQUIS9_R_2, mode=Mode.SUBTRACT)
    saliente_extruir3 = extrude(amount=SALIENTE_EXTRUIR3_DEPTH, both=True)

    # Simetría2: Saliente-Extruir3 across plane
    add(saliente_extruir3.mirror(Plane(origin=(0, 0, 0), x_dir=(0, 0, 1), z_dir=(1, 0, 0))))

    # Croquis10 → Saliente-Extruir4 (add)
    with BuildSketch(Plane(origin=(0, 5, 0), x_dir=(1, 0, 0), z_dir=(0, 1, 0))):
        with Locations(Location((0, -115, 0), (0, 0, 90))):
            Circle(CROQUIS10_R)
    extrude(amount=SALIENTE_EXTRUIR4_DEPTH)

    # Croquis10<3> → Saliente-Extruir5 (add)
    with BuildSketch(Plane(origin=(0, 5, 0), x_dir=(1, 0, 0), z_dir=(0, 1, 0))):
        with Locations(Location((0, -115, 0), (0, 0, 270))):
            Circle(CROQUIS10_3_R)
    extrude(amount=SALIENTE_EXTRUIR5_DEPTH)

    # Croquis11 → Cortar-Extruir1 (cut)
    with BuildSketch(Plane(origin=(0, 15, 0), x_dir=(1, 0, 0), z_dir=(0, 1, 0))):
        with Locations(Location((0, -115, 0), (0, 0, 270))):
            Circle(CROQUIS11_R)
    extrude(amount=-CORTAR_EXTRUIR1_DEPTH, mode=Mode.SUBTRACT)


solid = part.part
